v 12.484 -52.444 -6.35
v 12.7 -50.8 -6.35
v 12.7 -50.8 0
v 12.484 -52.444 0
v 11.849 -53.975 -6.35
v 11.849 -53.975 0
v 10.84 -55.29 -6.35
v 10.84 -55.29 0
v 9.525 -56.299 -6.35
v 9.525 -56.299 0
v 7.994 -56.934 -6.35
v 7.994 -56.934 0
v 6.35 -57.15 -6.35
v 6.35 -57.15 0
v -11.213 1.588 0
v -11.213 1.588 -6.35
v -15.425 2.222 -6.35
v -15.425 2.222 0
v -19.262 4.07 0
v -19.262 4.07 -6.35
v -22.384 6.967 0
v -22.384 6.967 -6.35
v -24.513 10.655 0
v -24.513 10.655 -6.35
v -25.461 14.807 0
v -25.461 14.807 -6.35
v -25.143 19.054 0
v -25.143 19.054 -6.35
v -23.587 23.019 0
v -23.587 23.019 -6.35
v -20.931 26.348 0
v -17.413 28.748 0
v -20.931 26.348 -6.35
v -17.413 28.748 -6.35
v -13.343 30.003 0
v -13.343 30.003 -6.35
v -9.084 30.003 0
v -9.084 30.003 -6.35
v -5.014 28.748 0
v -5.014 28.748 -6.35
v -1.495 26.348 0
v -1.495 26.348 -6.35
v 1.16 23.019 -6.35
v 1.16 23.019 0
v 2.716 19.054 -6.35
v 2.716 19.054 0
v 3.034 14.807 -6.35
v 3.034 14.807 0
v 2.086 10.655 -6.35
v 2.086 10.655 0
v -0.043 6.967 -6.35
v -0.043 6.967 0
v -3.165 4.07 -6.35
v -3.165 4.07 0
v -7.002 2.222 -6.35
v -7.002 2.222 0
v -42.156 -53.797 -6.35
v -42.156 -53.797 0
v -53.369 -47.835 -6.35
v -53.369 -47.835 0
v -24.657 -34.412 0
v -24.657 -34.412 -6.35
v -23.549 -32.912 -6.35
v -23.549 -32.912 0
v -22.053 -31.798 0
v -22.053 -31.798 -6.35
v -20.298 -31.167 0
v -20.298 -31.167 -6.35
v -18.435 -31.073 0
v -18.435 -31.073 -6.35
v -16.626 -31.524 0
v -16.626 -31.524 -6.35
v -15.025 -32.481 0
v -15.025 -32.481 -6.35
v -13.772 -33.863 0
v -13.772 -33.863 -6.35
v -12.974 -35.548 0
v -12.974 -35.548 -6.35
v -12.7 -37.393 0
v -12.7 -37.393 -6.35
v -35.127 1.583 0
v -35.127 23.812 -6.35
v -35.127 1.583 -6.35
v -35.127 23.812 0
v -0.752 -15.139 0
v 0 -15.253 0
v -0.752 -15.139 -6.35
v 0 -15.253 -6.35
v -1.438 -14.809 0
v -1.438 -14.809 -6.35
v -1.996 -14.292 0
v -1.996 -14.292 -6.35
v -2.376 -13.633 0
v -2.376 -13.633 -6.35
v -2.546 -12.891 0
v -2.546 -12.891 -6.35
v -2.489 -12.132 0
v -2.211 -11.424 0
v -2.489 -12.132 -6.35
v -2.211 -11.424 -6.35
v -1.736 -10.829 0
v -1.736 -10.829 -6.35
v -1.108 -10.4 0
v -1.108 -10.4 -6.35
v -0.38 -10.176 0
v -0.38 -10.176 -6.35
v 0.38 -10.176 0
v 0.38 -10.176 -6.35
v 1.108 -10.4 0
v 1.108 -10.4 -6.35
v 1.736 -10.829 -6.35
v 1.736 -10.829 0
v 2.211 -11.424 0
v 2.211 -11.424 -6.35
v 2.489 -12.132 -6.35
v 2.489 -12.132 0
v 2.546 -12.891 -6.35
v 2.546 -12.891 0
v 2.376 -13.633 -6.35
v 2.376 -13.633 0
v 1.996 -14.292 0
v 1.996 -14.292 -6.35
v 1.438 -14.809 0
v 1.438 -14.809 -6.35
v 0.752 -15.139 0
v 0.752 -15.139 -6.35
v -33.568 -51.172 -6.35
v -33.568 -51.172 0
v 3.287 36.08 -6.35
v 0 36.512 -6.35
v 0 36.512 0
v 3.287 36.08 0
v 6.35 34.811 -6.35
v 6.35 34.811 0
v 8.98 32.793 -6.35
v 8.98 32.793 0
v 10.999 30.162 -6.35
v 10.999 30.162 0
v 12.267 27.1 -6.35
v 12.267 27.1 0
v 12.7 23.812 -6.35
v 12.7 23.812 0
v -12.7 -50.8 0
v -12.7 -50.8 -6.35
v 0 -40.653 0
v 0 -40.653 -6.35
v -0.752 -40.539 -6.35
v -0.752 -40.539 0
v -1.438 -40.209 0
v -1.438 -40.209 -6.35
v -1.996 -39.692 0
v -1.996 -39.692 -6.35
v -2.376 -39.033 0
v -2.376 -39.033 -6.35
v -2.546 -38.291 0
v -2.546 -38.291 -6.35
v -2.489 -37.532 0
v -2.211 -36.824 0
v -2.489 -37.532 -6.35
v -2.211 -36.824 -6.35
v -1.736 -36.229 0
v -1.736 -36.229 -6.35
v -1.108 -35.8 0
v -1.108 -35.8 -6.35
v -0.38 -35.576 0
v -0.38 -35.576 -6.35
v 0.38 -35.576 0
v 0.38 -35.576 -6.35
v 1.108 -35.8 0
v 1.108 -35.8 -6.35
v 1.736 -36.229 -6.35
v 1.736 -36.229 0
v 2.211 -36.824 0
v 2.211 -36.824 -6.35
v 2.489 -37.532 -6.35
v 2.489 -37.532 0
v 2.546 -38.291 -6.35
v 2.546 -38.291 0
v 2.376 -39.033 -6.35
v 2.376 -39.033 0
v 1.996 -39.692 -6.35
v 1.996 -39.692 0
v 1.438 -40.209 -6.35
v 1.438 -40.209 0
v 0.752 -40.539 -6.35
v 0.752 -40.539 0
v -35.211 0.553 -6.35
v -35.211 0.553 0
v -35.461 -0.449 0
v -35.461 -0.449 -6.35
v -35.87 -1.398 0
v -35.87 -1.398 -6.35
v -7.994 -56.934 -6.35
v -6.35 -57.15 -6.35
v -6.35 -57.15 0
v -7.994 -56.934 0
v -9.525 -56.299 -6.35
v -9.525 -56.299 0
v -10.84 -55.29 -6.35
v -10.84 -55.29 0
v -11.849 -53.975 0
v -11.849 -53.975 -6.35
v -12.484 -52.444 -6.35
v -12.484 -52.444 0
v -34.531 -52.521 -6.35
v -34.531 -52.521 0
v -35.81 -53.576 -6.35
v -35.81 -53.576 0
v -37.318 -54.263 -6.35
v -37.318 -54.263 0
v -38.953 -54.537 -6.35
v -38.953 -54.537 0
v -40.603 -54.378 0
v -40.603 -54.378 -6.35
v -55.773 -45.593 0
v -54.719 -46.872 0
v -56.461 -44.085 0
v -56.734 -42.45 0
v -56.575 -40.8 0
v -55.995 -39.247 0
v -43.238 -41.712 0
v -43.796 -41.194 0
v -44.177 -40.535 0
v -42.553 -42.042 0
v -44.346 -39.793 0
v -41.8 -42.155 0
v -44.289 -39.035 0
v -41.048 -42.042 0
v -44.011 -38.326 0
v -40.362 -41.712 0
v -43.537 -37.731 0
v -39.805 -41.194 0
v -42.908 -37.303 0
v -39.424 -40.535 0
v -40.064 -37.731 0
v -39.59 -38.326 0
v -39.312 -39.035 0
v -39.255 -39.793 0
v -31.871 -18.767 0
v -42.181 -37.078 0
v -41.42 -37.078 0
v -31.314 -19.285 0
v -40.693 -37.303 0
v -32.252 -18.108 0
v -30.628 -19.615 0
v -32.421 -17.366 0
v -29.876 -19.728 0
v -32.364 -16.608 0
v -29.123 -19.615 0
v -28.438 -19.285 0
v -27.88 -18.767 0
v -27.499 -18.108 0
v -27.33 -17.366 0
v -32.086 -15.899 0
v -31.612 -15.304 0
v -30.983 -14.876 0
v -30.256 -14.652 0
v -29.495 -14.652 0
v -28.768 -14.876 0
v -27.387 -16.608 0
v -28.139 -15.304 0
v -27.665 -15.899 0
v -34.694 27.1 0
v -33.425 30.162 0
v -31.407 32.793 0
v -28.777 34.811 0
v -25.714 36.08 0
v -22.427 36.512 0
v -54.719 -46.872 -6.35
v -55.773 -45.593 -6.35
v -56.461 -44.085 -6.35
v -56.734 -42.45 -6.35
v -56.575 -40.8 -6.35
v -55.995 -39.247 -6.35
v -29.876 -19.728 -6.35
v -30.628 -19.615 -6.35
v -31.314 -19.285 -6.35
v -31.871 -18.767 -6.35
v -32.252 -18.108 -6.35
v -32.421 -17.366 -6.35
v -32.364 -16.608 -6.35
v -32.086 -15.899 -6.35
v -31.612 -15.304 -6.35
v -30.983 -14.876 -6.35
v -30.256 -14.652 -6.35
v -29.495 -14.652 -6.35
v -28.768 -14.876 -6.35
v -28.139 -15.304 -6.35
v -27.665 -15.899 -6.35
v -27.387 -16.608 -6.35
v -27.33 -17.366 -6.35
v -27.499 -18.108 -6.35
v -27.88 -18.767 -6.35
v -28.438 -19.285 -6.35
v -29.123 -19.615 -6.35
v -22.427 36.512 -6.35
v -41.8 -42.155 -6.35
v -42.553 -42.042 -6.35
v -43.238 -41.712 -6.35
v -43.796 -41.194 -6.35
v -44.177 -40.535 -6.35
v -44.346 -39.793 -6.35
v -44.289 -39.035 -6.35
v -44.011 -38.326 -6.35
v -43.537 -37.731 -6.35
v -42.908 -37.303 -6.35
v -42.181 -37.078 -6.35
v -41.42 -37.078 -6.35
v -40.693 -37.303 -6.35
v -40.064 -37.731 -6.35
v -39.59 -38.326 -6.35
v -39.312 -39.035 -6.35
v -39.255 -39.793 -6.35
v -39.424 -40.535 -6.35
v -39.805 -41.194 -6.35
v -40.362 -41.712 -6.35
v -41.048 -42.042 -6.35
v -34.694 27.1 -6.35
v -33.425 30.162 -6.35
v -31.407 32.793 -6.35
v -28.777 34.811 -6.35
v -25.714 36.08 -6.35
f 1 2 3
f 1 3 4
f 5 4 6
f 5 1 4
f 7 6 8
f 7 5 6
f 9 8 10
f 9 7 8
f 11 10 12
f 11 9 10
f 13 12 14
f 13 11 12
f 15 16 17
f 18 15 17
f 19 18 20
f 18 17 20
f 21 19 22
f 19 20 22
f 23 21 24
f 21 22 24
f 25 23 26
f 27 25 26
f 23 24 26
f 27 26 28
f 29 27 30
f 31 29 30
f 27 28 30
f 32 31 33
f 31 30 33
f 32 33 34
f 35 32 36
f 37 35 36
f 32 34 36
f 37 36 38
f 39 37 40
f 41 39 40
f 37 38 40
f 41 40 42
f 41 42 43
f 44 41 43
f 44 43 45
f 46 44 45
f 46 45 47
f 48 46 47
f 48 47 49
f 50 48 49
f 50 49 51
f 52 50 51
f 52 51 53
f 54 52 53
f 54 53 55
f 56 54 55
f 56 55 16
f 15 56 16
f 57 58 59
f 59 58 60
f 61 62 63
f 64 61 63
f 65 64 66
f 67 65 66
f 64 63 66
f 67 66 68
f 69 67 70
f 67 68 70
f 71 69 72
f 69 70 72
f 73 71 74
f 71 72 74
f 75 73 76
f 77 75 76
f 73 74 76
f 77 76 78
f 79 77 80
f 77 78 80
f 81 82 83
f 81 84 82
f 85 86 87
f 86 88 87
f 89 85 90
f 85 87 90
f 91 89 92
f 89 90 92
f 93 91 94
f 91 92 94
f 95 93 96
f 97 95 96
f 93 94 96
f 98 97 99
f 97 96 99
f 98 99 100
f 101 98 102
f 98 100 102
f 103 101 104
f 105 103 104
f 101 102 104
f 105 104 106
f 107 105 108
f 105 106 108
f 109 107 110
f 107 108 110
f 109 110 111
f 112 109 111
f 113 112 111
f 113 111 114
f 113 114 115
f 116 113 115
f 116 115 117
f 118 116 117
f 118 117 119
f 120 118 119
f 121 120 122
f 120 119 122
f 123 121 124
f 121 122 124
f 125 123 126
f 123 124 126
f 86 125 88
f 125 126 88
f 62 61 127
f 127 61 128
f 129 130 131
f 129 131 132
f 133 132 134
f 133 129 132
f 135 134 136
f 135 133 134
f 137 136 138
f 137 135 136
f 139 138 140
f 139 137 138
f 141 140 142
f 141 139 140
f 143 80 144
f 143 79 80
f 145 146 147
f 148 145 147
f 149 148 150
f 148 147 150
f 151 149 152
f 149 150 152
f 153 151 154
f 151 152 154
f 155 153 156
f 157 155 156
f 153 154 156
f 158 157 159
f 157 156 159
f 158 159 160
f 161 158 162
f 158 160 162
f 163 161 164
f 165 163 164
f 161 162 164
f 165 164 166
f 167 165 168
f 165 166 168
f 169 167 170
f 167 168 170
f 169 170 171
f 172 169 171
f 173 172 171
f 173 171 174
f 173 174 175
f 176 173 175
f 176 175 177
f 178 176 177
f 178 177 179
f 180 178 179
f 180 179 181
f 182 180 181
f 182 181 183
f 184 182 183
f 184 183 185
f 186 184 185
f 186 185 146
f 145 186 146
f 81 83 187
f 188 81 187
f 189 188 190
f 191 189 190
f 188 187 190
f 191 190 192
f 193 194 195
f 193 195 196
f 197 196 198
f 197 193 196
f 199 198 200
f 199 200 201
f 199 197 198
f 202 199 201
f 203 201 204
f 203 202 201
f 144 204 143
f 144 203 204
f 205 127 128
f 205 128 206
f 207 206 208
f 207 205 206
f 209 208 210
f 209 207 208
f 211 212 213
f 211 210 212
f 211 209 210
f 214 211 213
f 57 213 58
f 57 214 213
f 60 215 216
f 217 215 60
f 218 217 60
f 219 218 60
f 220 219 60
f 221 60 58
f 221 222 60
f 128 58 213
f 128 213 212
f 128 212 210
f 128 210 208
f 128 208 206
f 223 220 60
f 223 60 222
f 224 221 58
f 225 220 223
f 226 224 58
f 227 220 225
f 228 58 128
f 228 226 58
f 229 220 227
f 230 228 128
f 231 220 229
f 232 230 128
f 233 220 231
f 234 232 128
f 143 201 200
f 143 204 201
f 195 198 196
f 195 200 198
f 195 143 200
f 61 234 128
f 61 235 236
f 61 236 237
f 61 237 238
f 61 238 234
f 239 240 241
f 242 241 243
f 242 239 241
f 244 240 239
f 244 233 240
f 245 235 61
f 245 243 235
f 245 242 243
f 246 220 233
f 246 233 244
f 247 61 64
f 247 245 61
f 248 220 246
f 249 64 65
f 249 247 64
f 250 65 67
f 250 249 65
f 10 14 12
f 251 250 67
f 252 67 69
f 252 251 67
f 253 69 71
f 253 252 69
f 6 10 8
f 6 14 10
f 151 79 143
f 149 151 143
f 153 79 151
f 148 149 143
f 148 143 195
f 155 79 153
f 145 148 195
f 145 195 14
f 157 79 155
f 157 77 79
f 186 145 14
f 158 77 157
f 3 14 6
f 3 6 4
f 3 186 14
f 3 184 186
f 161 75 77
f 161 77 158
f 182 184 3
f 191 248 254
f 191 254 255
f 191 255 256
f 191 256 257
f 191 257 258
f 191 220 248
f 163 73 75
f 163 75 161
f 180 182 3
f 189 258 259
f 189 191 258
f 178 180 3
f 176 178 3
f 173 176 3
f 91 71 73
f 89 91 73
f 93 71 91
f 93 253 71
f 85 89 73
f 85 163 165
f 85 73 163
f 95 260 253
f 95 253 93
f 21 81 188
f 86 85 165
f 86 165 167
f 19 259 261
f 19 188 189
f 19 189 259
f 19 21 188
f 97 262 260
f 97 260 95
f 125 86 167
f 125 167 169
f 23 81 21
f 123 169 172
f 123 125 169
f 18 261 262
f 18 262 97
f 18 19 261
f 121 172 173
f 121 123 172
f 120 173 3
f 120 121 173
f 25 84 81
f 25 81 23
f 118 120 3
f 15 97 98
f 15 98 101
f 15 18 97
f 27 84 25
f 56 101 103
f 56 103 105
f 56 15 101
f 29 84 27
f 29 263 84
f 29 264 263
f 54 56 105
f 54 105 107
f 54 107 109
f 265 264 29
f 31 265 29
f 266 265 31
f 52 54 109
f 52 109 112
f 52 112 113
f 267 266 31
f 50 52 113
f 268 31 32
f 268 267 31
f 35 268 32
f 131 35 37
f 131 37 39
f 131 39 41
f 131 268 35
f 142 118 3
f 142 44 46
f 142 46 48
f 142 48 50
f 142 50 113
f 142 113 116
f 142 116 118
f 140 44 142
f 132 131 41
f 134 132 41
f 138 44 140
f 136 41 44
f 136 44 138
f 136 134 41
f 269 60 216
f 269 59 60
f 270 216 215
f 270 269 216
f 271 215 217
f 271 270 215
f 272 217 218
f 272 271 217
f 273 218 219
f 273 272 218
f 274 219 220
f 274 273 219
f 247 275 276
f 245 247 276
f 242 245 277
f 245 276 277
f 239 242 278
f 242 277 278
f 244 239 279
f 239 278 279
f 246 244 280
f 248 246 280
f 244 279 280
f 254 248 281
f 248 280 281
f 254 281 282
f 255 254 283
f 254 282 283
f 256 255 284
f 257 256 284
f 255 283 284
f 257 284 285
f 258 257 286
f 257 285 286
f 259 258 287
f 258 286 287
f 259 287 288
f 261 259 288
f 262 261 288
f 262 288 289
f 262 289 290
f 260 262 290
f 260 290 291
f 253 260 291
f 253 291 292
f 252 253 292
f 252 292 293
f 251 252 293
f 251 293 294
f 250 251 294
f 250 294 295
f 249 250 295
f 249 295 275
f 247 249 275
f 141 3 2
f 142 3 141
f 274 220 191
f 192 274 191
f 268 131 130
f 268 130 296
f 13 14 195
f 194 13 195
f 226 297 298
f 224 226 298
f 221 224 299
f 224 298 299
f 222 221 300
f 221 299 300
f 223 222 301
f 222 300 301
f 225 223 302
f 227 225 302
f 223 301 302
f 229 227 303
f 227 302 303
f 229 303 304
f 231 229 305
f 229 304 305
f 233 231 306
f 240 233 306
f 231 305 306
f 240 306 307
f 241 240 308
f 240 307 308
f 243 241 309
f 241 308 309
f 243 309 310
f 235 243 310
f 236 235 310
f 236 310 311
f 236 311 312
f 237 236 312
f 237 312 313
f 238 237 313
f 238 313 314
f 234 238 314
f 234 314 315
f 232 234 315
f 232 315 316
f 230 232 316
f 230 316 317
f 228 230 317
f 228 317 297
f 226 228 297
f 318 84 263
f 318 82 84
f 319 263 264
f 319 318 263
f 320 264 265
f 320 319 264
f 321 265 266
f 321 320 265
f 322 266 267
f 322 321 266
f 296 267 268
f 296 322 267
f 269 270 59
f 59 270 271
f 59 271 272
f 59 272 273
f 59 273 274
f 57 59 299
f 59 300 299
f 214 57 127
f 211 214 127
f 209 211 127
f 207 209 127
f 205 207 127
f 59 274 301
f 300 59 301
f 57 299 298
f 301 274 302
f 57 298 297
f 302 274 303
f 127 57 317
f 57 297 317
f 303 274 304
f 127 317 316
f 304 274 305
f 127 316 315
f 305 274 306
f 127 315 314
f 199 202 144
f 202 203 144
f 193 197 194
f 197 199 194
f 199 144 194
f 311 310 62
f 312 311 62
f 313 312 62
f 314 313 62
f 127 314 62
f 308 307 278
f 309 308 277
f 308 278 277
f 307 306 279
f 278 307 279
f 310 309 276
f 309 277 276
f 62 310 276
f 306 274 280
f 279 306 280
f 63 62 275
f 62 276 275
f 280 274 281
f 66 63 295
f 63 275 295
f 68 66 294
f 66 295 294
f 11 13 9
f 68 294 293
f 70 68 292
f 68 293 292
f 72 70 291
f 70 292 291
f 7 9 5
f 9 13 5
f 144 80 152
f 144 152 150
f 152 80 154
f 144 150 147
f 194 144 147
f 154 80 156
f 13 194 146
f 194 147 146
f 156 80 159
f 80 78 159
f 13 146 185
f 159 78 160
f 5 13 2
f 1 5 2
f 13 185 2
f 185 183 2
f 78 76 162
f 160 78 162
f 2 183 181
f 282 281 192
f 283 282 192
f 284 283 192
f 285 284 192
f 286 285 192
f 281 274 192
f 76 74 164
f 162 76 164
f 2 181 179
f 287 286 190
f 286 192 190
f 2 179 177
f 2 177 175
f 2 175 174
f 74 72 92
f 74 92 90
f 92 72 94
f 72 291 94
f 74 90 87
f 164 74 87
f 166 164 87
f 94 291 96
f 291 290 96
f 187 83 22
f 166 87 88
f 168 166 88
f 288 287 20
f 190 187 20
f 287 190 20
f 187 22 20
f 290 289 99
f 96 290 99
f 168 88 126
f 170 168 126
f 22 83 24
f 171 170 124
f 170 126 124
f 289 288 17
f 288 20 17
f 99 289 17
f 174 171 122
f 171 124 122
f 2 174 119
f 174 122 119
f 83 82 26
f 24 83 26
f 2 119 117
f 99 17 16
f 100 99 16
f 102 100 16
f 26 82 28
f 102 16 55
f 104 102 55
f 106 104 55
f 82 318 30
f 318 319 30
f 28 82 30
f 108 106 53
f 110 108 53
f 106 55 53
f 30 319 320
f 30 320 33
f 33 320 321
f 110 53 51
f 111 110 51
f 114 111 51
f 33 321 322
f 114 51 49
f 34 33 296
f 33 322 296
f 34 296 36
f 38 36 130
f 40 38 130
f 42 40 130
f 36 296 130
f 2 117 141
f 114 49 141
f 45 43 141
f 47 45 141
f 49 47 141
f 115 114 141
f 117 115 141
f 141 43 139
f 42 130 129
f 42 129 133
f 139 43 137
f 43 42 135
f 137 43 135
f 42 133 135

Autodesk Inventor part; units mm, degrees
ref_plane "YZ Plane" through (0, 0, 0) normal (1, 0, 0) x (0, 1, 0)
ref_plane "XZ Plane" through (0, 0, 0) normal (0, 1, 0) x (-1, 0, 0)
ref_plane "XY Plane" through (0, 0, 0) normal (0, 0, 1) x (1, 0, 0)
sketch "Sketch1" plane through (0, 0, 0) normal (0, 0, 1) x (1, 0, 0)
  line L0 (-12.7, 0) -> (12.7, 0) construction
  line L1 (12.7, 0) -> (12.7, -57.15)
  line L2 (12.7, -57.15) -> (-12.7, -57.15)
  line L3 (-12.7, -57.15) -> (-12.7, 0) construction
  line L4 (-35.1269, 0) -> (-12.7, -11.9246) construction
  line L5 (-12.7, -11.9246) -> (-36.5492, -56.7783)
  line L6 (-36.5492, -56.7783) -> (-58.976, -44.8537)
  line L7 (-58.976, -44.8537) -> (-35.1269, 0)
  line L8 (-23.9134, -5.9623) -> (-47.7626, -50.816) construction
  line L9 (-35.1269, 0) -> (12.7, 0)
  line L10 (-12.7, -11.9246) -> (-12.7, -57.15)
  point P0 (0, 0)
  point P1 (0, 0)
  point P2 (-29.8757, -17.1757)
  point P3 (-41.8003, -39.6026)
  point P4 (0, -12.7)
  point P5 (0, -38.1)
  dimension "d0" = 25.4
  dimension "d1" = 25.4
  dimension "d2" = 28
  dimension "d3" = 50.8
  dimension "d4" = 25.4
  dimension "d5" = 12.7
  dimension "d6" = 25.4
  dimension "d7" = 12.7
  dimension "d8" = 57.15
extrude "Extrusion1" add sketch "Sketch1" against normal blind 6.35
hole "Hole1" at (-29.8757, -17.1757, 0) at (-41.8003, -39.6026, 0) at (0, -12.7, 0) at (0, -38.1, 0) direction (0, 0, -1) diameter 5.1054 end through all clearance for "Flat Head Machine Screw (82)" size "#10" standard "Ansi Unified Screw Threads"
sketch "Sketch2" plane through (0, 0, 0) normal (0, 0, 1) x (1, 0, 0)
  circle A0 centre (0, -12.7) radius 2.5527 construction
  circle A1 centre (-29.8757, -17.1757) radius 2.5527 construction
  circle A2 centre (-41.8003, -39.6026) radius 2.5527 construction
  circle A3 centre (0, -38.1) radius 2.5527 construction
  line L0 (-12.7, -57.15) -> (12.7, -57.15) construction
  line L1 (12.7, -57.15) -> (12.7, 0) construction
  line L2 (12.7, 0) -> (-35.1269, 0) projected
  line L3 (-35.1269, 0) -> (-58.976, -44.8537) construction
  line L4 (-58.976, -44.8537) -> (-36.5492, -56.7783) construction
  line L5 (-36.5492, -56.7783) -> (-12.7, -11.9246) construction
  line L6 (-12.7, -11.9246) -> (-12.7, -57.15) construction
  circle A4 centre (0, -12.7) radius 2.5527 construction
  circle A5 centre (-29.8757, -17.1757) radius 2.5527 construction
  circle A6 centre (-41.8003, -39.6026) radius 2.5527 construction
  circle A7 centre (0, -38.1) radius 2.5527 construction
  line L7 (12.7, 0) -> (12.7, -57.15) construction
  line L8 (12.7, -57.15) -> (-12.7, -57.15) construction
  line L9 (-12.7, -57.15) -> (-12.7, -11.9246) construction
  line L10 (-36.5492, -56.7783) -> (-58.976, -44.8537) construction
  line L11 (-58.976, -44.8537) -> (-35.1269, 0) construction
  line L12 (-35.1269, 0) -> (12.7, 0) construction
  circle A8 centre (-11.2134, 15.875) radius 14.2875 construction
  line L13 (12.7, 0) -> (-35.1269, 0) construction
  line L14 (-35.1269, 0) -> (-58.976, -44.8537) construction
  circle A9 centre (0, -12.7) radius 2.5527 construction
  circle A10 centre (-29.8757, -17.1757) radius 2.5527 construction
  circle A11 centre (-41.8003, -39.6026) radius 2.5527 construction
  circle A12 centre (0, -38.1) radius 2.5527 construction
  line L15 (12.7, 0) -> (12.7, -57.15) construction
  line L16 (12.7, -57.15) -> (-12.7, -57.15) construction
  line L17 (-12.7, -57.15) -> (-12.7, -11.9246) construction
  line L18 (-36.5492, -56.7783) -> (-58.976, -44.8537) construction
  line L19 (-58.976, -44.8537) -> (-35.1269, 0) construction
  line L20 (-35.1269, 0) -> (12.7, 0) construction
  line L21 (-35.1269, 0) -> (12.7, 0) construction
  line L22 (12.7, 0) -> (12.7, 36.5125)
  line L23 (12.7, 36.5125) -> (-35.1269, 36.5125)
  line L24 (-35.1269, 36.5125) -> (-35.1269, 0)
  line L25 (-12.7, -11.9246) -> (-36.5492, -56.7783) projected
  line L26 (-12.7, -11.9246) -> (-36.5492, -56.7783) projected
  point P0 (0, 0)
  point P1 (-11.2134, 0)
  point P2 (-11.2134, 0)
  point P3 (-11.2134, 30.1625)
  point P4 (-11.2134, 36.5125)
  dimension "d19" = 28.575
  dimension "d20" = 15.875
  dimension "d21" = 6.35
extrude "Extrusion2" add sketch "Sketch2" against normal up to surface (6.35 mm away)
hole "Hole2" at (-11.2134, 15.875, 0) direction (0, 0, -1) diameter 28.575 end through all
fillet "Fillet1" radius 6.35 6 edges at (12.7, -57.15, -3.175) (-12.7, -57.15, -3.175) (-12.7, -11.9246, -3.175) (-36.5492, -56.7783, -3.175) (-58.976, -44.8537, -3.175) (-35.1269, 0, -3.175)
fillet "Fillet2" radius 12.7 2 edges at (-35.1269, 36.5125, -3.175) (12.7, 36.5125, -3.175)
properties part number "CL4-010" material "Aluminum 6061"
